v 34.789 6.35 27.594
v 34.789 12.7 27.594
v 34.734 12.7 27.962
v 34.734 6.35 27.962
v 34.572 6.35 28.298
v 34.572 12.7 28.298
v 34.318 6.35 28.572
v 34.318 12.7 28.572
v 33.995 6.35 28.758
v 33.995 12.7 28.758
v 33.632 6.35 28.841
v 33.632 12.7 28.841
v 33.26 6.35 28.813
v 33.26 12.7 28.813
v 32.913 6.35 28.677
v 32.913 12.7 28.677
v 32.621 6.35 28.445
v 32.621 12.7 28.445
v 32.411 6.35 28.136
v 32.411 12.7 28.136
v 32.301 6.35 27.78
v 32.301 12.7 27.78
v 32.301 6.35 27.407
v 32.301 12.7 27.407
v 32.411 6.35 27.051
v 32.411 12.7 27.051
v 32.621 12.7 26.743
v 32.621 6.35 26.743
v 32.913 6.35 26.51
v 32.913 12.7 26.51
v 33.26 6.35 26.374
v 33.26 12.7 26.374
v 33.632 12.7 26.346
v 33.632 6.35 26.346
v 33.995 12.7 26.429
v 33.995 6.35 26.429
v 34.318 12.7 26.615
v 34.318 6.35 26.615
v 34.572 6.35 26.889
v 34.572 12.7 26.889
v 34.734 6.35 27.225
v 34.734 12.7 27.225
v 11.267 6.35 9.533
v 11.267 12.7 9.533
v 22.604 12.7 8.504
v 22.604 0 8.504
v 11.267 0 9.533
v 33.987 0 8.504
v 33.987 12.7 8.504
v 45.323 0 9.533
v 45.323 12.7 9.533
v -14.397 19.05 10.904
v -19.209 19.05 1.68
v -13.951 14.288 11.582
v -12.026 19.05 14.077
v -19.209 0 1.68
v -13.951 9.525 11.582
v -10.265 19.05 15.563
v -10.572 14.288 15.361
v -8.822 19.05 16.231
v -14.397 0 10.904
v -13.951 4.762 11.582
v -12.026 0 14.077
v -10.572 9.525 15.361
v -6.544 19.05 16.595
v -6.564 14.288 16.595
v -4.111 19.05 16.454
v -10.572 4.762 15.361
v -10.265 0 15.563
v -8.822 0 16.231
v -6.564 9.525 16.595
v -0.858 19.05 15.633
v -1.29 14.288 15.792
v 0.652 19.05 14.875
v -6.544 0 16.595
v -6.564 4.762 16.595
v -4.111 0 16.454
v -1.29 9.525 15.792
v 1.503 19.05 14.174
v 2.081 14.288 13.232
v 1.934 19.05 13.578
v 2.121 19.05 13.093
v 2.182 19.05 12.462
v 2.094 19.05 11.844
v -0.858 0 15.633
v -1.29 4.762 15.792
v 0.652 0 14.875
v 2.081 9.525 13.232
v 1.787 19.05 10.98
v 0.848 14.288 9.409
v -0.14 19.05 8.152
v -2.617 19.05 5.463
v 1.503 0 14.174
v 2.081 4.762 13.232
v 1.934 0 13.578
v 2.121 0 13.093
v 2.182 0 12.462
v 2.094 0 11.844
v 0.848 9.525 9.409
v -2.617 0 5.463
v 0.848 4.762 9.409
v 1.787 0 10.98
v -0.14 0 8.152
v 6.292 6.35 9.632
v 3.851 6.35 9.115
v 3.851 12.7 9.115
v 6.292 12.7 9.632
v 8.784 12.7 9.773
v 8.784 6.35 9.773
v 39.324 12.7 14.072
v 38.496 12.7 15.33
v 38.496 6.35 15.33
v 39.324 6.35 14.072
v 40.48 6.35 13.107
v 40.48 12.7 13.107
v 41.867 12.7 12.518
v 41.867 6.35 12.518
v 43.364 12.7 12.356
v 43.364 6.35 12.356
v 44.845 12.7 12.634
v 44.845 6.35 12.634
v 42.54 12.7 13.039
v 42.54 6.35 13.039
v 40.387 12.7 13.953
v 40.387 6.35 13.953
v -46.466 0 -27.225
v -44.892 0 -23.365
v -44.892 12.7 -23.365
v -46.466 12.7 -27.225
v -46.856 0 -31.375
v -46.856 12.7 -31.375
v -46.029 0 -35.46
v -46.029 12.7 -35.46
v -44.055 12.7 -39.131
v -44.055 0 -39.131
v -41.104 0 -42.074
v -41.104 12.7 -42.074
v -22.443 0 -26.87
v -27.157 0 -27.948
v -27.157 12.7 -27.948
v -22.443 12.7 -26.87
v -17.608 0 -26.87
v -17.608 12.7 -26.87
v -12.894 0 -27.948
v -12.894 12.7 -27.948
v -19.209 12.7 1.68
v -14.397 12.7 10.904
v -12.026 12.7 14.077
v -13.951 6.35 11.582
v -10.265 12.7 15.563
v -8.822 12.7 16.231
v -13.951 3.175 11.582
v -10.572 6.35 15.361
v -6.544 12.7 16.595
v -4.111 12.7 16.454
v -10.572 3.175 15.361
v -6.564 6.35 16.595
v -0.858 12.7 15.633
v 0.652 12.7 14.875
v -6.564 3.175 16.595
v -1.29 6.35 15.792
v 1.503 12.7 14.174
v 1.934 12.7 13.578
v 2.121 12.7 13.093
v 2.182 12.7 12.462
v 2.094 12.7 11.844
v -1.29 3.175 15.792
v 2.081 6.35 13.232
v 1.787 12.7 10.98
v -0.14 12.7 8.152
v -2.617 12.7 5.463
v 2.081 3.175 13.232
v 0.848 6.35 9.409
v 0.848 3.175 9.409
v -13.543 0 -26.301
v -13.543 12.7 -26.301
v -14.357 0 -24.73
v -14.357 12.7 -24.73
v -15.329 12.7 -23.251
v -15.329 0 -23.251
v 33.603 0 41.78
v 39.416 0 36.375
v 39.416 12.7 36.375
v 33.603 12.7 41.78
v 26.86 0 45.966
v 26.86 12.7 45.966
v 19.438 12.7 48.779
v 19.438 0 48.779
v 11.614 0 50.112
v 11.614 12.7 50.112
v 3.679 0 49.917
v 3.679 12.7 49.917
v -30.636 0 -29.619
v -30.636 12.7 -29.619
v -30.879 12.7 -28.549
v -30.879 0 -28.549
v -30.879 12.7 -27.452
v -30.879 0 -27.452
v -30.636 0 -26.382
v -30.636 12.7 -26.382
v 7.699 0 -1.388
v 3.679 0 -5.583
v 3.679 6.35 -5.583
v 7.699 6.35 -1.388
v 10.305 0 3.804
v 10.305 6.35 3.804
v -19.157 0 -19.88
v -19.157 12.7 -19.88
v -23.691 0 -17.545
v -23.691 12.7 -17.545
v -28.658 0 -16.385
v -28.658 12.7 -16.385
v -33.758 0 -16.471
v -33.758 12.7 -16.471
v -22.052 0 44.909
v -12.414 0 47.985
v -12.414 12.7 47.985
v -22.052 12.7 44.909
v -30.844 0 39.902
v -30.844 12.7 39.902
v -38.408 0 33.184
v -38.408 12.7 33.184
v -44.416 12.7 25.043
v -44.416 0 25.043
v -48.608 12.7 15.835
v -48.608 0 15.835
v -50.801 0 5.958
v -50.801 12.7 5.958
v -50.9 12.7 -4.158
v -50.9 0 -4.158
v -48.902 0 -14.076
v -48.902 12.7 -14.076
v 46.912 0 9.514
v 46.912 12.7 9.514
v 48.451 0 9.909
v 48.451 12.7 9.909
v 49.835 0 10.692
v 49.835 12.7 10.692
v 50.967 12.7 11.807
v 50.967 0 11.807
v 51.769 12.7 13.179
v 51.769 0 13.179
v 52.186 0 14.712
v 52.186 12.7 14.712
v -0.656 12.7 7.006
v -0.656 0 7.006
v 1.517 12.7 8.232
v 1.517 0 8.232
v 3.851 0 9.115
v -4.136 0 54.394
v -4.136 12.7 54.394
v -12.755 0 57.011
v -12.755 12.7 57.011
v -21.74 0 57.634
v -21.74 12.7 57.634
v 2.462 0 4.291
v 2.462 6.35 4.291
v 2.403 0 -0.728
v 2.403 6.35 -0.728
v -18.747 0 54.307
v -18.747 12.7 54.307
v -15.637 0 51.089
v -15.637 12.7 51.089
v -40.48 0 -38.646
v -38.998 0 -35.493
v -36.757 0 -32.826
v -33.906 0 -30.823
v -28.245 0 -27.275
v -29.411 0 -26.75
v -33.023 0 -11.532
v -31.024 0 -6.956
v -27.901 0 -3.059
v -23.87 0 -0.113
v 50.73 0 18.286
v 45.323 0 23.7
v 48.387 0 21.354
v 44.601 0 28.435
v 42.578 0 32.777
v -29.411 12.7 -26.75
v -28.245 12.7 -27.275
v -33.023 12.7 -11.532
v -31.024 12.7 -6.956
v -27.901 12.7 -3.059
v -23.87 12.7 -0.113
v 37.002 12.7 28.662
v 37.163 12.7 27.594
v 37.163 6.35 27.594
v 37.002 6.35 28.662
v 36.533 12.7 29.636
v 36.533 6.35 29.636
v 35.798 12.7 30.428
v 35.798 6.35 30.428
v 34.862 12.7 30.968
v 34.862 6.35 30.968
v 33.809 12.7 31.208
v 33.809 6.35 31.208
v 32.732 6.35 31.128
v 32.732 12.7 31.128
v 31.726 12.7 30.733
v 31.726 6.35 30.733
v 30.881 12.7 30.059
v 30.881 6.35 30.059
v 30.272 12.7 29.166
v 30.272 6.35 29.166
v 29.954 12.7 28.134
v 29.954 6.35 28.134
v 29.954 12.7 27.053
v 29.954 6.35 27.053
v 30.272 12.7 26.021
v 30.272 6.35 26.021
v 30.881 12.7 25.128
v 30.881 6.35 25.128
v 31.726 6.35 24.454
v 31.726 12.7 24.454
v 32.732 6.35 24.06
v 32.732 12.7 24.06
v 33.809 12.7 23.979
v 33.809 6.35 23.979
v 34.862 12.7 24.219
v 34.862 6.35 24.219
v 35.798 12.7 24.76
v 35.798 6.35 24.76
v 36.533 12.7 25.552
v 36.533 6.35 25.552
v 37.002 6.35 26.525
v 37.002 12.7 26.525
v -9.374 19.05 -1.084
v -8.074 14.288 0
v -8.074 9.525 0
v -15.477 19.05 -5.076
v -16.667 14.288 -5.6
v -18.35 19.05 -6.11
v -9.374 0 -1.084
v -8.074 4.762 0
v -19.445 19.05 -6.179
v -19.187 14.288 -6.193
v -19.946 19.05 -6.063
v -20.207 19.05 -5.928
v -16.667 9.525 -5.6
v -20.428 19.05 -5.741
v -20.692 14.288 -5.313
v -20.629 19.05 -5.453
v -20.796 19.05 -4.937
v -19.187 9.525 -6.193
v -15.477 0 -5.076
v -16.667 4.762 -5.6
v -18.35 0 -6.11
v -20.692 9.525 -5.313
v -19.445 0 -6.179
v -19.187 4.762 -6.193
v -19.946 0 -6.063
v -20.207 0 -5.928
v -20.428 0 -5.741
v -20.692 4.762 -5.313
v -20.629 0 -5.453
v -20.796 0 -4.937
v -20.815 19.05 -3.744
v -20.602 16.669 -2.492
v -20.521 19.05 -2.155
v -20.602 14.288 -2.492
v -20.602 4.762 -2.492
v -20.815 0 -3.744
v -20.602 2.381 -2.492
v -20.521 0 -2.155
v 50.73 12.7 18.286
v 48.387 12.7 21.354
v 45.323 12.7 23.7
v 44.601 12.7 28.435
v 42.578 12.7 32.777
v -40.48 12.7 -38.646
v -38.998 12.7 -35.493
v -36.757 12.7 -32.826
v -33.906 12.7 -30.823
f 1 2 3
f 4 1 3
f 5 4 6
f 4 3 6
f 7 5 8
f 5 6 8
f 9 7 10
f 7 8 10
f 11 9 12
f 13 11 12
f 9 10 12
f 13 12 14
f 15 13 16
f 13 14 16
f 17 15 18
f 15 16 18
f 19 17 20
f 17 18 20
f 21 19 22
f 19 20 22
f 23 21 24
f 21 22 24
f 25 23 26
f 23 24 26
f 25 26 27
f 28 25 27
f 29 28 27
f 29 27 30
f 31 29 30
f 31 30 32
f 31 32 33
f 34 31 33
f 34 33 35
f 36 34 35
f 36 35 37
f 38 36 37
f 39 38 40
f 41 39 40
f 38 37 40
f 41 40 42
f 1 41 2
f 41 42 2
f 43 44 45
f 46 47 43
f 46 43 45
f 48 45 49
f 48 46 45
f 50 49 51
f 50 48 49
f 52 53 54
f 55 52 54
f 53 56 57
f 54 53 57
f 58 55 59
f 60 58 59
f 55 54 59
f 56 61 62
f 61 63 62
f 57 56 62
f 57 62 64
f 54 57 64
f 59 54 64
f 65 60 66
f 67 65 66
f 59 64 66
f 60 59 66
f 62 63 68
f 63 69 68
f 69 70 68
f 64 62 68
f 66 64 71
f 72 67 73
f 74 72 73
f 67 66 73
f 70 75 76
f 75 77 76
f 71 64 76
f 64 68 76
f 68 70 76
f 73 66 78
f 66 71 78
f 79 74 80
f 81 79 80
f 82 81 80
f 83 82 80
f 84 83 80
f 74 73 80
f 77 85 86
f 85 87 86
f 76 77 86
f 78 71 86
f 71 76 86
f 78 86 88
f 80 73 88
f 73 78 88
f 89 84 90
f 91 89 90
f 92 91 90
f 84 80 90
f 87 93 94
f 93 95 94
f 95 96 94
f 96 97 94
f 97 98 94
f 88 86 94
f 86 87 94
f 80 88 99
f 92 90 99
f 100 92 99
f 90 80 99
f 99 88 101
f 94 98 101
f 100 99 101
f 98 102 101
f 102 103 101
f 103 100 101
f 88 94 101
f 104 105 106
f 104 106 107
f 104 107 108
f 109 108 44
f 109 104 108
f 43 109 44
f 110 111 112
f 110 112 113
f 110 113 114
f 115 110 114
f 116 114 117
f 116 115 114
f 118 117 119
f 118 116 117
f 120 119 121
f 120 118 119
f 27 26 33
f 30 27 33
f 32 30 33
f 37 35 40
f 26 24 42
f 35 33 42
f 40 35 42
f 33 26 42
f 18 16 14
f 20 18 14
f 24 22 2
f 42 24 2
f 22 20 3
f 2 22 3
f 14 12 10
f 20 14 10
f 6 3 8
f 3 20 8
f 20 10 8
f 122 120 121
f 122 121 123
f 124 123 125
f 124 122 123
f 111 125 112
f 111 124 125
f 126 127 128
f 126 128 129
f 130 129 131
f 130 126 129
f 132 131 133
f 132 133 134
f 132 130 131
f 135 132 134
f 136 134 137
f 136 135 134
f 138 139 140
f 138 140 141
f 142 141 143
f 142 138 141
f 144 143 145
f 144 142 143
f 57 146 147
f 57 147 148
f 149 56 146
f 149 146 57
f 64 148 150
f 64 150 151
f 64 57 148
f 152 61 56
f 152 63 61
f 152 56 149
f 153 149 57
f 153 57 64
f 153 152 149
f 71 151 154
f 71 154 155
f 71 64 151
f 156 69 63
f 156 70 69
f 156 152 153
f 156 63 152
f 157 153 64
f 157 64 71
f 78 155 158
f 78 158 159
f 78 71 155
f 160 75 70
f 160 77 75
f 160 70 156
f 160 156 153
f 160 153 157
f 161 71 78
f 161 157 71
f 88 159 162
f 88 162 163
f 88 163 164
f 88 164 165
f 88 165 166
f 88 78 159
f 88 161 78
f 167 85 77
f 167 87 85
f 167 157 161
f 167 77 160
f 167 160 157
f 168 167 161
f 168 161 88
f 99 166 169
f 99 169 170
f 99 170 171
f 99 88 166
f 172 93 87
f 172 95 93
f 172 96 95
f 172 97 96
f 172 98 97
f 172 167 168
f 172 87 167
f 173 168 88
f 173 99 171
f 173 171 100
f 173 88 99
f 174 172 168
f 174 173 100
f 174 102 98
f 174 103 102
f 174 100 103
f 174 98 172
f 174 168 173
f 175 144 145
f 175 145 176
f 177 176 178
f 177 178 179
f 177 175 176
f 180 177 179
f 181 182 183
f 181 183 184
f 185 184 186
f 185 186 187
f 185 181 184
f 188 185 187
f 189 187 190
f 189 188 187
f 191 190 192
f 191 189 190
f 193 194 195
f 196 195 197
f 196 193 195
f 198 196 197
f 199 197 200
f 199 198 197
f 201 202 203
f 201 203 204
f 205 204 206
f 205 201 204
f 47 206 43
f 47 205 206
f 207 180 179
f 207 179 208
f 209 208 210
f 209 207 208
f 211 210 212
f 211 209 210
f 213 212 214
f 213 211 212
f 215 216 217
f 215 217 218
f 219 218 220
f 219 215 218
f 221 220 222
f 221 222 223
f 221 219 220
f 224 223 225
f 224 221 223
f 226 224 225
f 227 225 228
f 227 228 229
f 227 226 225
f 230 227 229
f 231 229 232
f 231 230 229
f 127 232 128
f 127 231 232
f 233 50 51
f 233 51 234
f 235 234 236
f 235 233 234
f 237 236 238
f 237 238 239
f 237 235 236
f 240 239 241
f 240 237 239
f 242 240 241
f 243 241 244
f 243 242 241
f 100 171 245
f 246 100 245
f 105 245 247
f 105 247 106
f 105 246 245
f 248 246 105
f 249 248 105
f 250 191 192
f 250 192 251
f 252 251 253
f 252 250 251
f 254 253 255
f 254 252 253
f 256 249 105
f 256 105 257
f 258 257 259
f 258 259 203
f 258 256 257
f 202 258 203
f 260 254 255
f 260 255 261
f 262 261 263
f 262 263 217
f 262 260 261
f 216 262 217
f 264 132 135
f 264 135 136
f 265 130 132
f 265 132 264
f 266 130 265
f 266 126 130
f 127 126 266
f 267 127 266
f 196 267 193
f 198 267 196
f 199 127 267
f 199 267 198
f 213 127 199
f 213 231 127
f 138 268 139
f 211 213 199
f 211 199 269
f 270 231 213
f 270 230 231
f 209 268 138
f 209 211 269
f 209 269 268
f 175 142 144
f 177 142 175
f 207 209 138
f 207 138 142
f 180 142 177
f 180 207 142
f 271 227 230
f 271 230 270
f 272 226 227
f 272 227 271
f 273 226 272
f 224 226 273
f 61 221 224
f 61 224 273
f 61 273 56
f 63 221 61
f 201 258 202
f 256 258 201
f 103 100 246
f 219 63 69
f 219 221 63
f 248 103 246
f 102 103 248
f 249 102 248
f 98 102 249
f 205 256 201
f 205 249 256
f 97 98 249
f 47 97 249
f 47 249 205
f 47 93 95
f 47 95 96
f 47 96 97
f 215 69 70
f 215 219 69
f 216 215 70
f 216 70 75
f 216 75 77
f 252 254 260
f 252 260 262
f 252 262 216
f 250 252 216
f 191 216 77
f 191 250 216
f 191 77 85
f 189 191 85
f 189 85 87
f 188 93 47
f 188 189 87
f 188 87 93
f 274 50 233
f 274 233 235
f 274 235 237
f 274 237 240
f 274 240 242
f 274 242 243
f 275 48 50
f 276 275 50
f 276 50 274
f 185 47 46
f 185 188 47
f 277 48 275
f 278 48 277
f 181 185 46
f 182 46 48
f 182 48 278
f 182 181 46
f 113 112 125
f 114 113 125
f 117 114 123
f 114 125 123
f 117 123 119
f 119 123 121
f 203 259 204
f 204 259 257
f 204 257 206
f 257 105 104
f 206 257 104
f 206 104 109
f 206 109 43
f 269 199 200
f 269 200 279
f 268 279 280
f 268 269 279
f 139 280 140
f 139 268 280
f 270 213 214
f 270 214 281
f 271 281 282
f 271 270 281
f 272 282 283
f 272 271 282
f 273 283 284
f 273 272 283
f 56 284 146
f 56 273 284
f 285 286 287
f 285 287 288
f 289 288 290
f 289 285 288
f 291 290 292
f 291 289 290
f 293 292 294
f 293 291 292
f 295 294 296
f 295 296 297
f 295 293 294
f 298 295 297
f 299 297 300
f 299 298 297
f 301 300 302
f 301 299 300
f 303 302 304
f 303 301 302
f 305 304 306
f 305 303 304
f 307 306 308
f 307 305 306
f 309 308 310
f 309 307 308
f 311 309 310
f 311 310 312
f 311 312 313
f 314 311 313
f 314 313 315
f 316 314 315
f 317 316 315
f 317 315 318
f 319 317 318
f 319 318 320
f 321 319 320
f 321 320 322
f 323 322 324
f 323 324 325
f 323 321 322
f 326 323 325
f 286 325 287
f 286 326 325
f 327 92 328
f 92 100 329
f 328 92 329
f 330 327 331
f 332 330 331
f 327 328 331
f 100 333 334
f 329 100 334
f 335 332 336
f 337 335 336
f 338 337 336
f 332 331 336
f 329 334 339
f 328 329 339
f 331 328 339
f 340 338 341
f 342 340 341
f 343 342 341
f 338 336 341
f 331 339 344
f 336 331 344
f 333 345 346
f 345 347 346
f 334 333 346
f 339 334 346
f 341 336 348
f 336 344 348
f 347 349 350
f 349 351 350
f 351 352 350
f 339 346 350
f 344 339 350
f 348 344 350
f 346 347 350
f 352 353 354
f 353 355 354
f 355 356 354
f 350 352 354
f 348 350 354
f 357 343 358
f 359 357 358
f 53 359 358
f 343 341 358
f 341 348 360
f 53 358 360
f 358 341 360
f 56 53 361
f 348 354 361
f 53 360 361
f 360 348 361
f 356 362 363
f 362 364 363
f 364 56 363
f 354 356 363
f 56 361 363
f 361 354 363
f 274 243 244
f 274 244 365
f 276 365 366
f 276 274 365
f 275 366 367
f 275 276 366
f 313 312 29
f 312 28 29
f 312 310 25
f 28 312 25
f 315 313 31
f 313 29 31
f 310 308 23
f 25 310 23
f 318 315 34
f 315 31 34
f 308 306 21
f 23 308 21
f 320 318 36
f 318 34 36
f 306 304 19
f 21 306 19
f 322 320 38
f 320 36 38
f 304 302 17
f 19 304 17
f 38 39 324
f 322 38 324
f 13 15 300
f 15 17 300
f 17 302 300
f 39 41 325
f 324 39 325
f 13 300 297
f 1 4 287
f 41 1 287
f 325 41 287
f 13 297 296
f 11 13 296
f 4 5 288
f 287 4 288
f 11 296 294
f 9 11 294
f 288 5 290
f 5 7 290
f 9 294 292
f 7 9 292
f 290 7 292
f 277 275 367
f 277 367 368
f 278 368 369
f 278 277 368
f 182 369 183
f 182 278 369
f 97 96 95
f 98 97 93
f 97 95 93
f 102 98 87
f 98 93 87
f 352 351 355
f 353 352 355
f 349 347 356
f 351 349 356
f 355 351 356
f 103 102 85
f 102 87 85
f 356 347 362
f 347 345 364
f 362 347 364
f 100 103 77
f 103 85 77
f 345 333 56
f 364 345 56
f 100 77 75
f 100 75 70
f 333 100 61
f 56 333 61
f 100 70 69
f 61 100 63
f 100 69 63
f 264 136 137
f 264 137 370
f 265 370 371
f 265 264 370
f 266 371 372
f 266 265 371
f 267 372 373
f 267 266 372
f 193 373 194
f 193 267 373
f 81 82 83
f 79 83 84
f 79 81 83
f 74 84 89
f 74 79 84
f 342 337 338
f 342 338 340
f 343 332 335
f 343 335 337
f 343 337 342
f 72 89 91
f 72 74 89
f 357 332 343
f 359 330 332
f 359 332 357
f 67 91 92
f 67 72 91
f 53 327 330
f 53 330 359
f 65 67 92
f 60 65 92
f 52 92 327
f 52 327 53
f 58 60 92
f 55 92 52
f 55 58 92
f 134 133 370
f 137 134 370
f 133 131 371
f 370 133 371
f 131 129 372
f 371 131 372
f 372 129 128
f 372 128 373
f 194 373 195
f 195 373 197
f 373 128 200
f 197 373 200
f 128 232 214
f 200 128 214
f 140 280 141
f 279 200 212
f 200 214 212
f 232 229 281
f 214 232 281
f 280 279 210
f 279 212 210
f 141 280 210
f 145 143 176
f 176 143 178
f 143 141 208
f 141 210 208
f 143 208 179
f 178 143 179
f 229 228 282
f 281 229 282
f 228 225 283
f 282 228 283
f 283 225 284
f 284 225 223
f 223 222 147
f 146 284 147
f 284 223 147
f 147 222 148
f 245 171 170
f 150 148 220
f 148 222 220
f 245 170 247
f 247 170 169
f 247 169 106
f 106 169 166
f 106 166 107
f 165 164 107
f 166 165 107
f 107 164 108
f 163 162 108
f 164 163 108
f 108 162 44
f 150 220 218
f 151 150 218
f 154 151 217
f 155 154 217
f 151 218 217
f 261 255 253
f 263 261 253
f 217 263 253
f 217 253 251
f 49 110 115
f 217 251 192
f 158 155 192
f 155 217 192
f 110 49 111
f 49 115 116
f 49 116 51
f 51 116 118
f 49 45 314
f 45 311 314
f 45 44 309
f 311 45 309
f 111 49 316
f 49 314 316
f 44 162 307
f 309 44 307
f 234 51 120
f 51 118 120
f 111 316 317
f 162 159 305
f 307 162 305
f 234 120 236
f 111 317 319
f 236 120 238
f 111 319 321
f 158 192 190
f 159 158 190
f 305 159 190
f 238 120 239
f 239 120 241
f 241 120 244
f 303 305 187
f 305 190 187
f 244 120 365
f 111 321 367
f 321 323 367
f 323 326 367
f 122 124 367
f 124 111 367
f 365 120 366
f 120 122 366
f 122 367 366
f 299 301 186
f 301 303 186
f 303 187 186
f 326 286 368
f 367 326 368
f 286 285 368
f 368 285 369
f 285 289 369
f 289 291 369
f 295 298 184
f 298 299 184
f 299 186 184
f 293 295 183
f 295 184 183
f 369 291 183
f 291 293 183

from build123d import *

# Parameters (mm, degrees)
F1_DEPTH = 12.7
F2_DEPTH = 19.05
F3_DEPTH = 6.35
F5_R     = 3.6248039948
F5_R_2   = 1.2512021704
F6_DEPTH = 6.35


with BuildPart() as f1:
    # F0 (on Front) → F1 (new body)
    with BuildSketch(Plane.XZ):
        with BuildLine():
            ThreePointArc((3.6792367881, 49.9169032008), (-8.3714505444, 55.9456389307), (-21.7398665845, 57.6338842511))
            ThreePointArc((-21.7398665845, 57.6338842511), (-17.2066275709, 52.6840836236), (-12.4139599502, 47.9850284755))
            ThreePointArc((-12.4139599502, 47.9850284755), (-46.7523372832, 20.5487057905), (-44.891897589, -23.3650133014))
            ThreePointArc((-44.891897589, -23.3650133014), (-46.5929180297, -33.447587322), (-41.1038920283, -42.0744270086))
            ThreePointArc((-41.1038920283, -42.0744270086), (-37.9642107868, -34.0867740006), (-30.6363515556, -29.6188127249))
            ThreePointArc((-30.6363515556, -29.6188127249), (-30.9094767042, -28.0005410314), (-30.6363515556, -26.3822693378))
            ThreePointArc((-30.6363515556, -26.3822693378), (-28.8195798251, -26.993220688), (-27.157433331, -27.9477834702))
            ThreePointArc((-27.157433331, -27.9477834702), (-20.025646314, -26.7343709555), (-12.893859297, -27.9477834702))
            ThreePointArc((-12.893859297, -27.9477834702), (-13.929931433, -25.5053748509), (-15.3291048482, -23.251241073))
            ThreePointArc((-15.3291048482, -23.251241073), (-23.6910290452, -17.5446532004), (-33.757558417, -16.471383509))
            ThreePointArc((-33.757558417, -16.471383509), (-29.5915011142, -4.9043217533), (-19.2087225, 1.6798151954))
            add(Edge.make_bspline(
                [(-19.2087225, 1.6798151954), (-17.8035989361, 5.0993095075), (-12.9843550668, 14.0212240186), (-7.8855104028, 17.9193437917), (5.978054798, 14.2401710297), (-0.3556607342, 7.8370366801), (-2.6167130563, 5.4628192447)],
                knots=[0.4693639104, 0.4693639104, 0.4693639104, 0.4693639104, 0.5753147778, 0.7155774859, 0.8585528337, 1, 1, 1, 1], degree=3))
            ThreePointArc((-2.6167130563, 5.4628192447), (0.4074846807, 7.6605040117), (3.8513593173, 9.1149172183))
            ThreePointArc((3.8513593173, 9.1149172183), (7.5353733419, 9.7502367875), (11.2674701959, 9.533341974))
            ThreePointArc((11.2674701959, 9.533341974), (28.2952608541, 8.3754906243), (45.3230515122, 9.533341974))
            ThreePointArc((45.3230515122, 9.533341974), (49.8347672661, 10.6915533806), (52.1864928305, 14.7123020142))
            ThreePointArc((52.1864928305, 14.7123020142), (49.6603027565, 19.8976409705), (45.3230515122, 23.69995974))
            ThreePointArc((45.3230515122, 23.69995974), (43.744069298, 30.6783005478), (39.4158102572, 36.3753698766))
            ThreePointArc((39.4158102572, 36.3753698766), (23.2169735976, 47.5518728634), (3.6792367881, 49.9169032008))
        make_face()
    extrude(amount=-F1_DEPTH)

    # F0 (on Front) → F3 (join)
    with BuildSketch(Plane.XZ):
        with BuildLine():
            ThreePointArc((3.6792367881, -5.5825185497), (9.1964480863, 1.1104100839), (11.2674701959, 9.533341974))
            ThreePointArc((11.2674701959, 9.533341974), (7.5353733419, 9.7502367875), (3.8513593173, 9.1149172183))
            ThreePointArc((3.8513593173, 9.1149172183), (2.263816376, 1.783783274), (3.6792367881, -5.5825185497))
        make_face()
    extrude(amount=-F3_DEPTH)

    # F5 (on offset) → F6 (cut)
    with BuildSketch(Plane.XZ.offset(-12.7)):
        with BuildLine():
            ThreePointArc((44.8446720839, 12.6342503354), (41.4374676394, 13.4343825506), (38.495644927, 15.3304133564))
            ThreePointArc((38.495644927, 15.3304133564), (41.1518693605, 12.7618448684), (44.8446720839, 12.6342503354))
        make_face()
        with Locations((33.5381813347, 27.593607083)):
            Circle(F5_R)
        with Locations((33.5381813347, 27.593607083)):
            Circle(F5_R_2, mode=Mode.SUBTRACT)
    extrude(amount=F6_DEPTH, mode=Mode.SUBTRACT)


with BuildPart() as f2:
    # F0 (on Front) → F2 (new body)
    with BuildSketch(Plane.XZ):
        with BuildLine():
            add(Edge.make_bspline(
                [(-2.6167130563, 5.4628192447), (-4.7019735301, 3.2731919965), (-7.5632549592, 0.0432873706), (-15.8032888039, -5.9553797603), (-21.9008513765, -6.7839396137), (-20.4588982524, -1.3625997096), (-19.2087225, 1.6798151954)],
                knots=[0, 0, 0, 0, 0.13044996, 0.2807897566, 0.3750966097, 0.4693639104, 0.4693639104, 0.4693639104, 0.4693639104], degree=3))
            add(Edge.make_bspline(
                [(-19.2087225, 1.6798151954), (-17.8035989361, 5.0993095075), (-12.9843550668, 14.0212240186), (-7.8855104028, 17.9193437917), (5.978054798, 14.2401710297), (-0.3556607342, 7.8370366801), (-2.6167130563, 5.4628192447)],
                knots=[0.4693639104, 0.4693639104, 0.4693639104, 0.4693639104, 0.5753147778, 0.7155774859, 0.8585528337, 1, 1, 1, 1], degree=3))
        make_face()
    extrude(amount=-F2_DEPTH)


solid = Compound([f1.part, f2.part])
